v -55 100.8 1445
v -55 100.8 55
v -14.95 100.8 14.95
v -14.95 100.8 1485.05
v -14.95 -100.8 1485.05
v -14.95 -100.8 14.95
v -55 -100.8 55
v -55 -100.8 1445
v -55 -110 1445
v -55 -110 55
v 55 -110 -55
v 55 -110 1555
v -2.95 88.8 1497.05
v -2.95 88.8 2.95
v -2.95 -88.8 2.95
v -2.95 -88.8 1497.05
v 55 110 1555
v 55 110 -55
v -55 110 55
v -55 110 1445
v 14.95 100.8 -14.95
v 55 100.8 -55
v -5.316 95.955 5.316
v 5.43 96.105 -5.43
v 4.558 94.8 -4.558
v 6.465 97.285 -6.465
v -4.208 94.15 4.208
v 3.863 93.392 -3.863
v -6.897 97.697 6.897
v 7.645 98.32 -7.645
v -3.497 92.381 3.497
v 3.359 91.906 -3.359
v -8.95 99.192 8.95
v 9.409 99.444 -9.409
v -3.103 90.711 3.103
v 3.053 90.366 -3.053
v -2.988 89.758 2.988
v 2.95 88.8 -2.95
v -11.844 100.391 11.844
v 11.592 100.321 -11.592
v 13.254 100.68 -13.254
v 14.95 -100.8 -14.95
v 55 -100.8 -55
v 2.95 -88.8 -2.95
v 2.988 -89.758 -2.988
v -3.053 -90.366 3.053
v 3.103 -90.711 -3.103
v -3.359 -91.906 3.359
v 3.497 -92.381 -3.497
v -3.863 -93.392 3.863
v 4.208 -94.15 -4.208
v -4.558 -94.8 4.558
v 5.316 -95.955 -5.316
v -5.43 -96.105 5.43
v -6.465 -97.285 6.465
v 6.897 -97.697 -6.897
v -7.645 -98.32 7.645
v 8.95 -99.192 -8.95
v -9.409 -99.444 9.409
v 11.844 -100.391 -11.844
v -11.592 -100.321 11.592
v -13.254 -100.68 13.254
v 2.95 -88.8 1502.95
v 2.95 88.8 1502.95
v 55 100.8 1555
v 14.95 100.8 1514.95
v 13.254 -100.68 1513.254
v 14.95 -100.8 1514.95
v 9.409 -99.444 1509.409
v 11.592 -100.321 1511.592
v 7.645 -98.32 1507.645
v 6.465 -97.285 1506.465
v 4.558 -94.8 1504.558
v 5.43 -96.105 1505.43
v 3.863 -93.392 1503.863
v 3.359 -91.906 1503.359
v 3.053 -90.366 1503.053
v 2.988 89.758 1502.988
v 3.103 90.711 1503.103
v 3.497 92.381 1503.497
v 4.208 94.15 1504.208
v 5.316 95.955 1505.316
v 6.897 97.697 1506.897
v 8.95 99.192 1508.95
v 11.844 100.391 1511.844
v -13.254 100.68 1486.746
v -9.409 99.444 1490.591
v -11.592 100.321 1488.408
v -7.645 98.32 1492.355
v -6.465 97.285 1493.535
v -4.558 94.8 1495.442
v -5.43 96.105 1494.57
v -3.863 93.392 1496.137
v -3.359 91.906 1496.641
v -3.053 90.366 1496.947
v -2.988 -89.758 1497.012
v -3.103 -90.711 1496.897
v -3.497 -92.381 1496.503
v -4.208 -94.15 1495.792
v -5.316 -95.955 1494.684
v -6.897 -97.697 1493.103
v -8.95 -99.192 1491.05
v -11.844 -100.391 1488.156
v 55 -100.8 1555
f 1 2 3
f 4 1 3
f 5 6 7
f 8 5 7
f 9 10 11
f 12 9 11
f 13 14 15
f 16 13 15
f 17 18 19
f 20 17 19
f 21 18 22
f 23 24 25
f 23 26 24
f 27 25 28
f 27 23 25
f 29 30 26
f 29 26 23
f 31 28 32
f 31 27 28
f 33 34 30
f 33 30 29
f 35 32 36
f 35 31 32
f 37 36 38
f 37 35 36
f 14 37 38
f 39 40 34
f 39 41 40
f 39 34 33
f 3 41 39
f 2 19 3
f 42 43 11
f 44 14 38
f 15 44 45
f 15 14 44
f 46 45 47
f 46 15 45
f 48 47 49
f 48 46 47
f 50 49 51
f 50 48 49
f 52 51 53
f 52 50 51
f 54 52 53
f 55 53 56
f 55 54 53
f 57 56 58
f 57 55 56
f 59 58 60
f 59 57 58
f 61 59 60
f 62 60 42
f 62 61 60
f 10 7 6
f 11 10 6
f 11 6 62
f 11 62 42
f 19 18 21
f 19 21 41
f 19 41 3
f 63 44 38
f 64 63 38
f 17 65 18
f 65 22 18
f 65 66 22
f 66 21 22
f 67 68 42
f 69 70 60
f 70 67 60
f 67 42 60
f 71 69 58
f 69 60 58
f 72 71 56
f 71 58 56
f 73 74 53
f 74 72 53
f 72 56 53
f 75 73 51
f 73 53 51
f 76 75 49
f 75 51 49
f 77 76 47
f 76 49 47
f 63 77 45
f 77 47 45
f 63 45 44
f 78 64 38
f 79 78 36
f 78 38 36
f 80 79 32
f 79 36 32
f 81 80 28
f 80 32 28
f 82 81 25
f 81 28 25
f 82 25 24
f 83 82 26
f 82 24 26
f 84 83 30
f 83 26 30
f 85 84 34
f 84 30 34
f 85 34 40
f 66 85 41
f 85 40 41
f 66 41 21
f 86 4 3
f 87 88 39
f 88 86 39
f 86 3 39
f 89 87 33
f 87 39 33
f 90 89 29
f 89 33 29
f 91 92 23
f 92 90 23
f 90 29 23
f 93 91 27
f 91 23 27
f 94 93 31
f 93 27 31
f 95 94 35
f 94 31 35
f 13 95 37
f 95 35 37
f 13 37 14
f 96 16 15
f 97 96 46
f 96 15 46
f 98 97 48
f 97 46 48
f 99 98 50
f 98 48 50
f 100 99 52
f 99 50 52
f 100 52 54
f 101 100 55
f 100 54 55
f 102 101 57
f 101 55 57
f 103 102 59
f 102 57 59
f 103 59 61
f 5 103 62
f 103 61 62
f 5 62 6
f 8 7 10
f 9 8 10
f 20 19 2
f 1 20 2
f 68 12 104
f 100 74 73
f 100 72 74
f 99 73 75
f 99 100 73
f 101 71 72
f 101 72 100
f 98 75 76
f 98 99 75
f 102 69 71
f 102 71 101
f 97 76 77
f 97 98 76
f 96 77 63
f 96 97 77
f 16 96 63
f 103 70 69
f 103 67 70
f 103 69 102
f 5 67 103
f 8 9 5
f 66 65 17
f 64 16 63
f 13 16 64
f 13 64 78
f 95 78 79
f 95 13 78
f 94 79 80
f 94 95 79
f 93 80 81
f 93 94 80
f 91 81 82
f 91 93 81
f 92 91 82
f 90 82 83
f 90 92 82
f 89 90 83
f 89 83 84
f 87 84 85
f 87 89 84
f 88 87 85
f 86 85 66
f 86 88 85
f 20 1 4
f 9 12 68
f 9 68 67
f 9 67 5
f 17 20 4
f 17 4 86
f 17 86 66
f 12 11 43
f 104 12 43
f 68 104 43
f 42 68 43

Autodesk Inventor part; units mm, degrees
ref_plane "Start plane" through (0, 0, -55) normal (0, 0, 1) x (1, 0, 0)
ref_plane "End plane" through (0, 0, 1555) normal (0, 0, 1) x (1, 0, 0)
sketch "Sketch2" plane through (0, 0, 0) normal (0, 0, 1) x (1, 0, 0)
  line L0 (-55, 100.8) -> (-14.95, 100.8)
  line L1 (-55, 110) -> (-55, 100.8)
  line L2 (55, 110) -> (-55, 110)
  line L3 (55, 100.8) -> (55, 110)
  line L4 (14.95, 100.8) -> (55, 100.8)
  line L5 (2.95, -88.8) -> (2.95, 88.8)
  line L6 (55, -100.8) -> (14.95, -100.8)
  line L7 (55, -110) -> (55, -100.8)
  line L8 (-55, -100.8) -> (-55, -110)
  line L9 (-14.95, -100.8) -> (-55, -100.8)
  line L10 (-2.95, 88.8) -> (-2.95, -88.8)
  line L11 (0, -154) -> (0, 154) construction
  line L12 (-2.95, -100.8) -> (2.95, -100.8) construction
  arc A0 (-14.95, -100.8) -> (-2.95, -88.8) centre (-14.95, -88.8) ccw
  arc A1 (-2.95, 88.8) -> (-14.95, 100.8) centre (-14.95, 88.8) ccw
  arc A2 (14.95, 100.8) -> (2.95, 88.8) centre (14.95, 88.8) ccw
  arc A3 (2.95, -88.8) -> (14.95, -100.8) centre (14.95, -88.8) ccw
  line L13 (-77, 0) -> (77, 0) construction
  line L14 (-55, -110) -> (55, -110)
  point P0 (-2.95, 100.8)
  point P1 (2.95, 100.8)
  point P2 (0, 0)
  point P3 (0, -100.8)
  point P4 (0, 0)
  dimension "d1" = 220
  dimension "d3" = 9.2
  dimension "d5" = 5.9
  dimension "d7" = 110
  dimension "d13" = 12
  dimension "d14" = 110
  dimension "d15" = 55
extrude "Body" add sketch "Sketch2" along normal up to surface (1610 mm away) from surface at -55
sketch "Sketch3" plane through (0, 0, 0) normal (0, 0, 1) x (1, 0, 0)
  line L0 (0, 0) -> (10, 0)
ref_plane "Work Plane3" through (0, 0, 0) normal (0, -1, 0) x (1, 0, 0)
ref_plane "Work Plane4" through (55, 0, 1555) normal (-0.7071, 0, 0.7071) x (0.7071, 0, 0.7071)
split "Split1" plane through (55, 0, 1555) removes the side toward (-0.7071, 0, 0.7071)
ref_plane "Work Plane5" through (55, 0, -55) normal (-0.7071, 0, -0.7071) x (-0.7071, 0, 0.7071)
split "Split2" plane through (55, 0, -55) removes the side toward (-0.7071, 0, -0.7071)
sketch "Sketch4" plane through (0, 0, 0) normal (0, -1, 0) x (1, 0, 0)
  line L0 (-2, -55) -> (12, -55) projected
  line L1 (-2, 1555) -> (12, 1555) projected
  dimension "d19" = 1610
equation "\"d1\" = ParH"
equation "\"d3\" = t2"
equation "\"d5\" = t1"
equation "\"d7\" = b"
equation "\"d13\" = R1"
equation "\"d14\" = 0.5 * d1"
equation "\"d15\" = 0.5 * d7"
equation "\"d8\" = G_L"
equation "\"b\" = 110"
equation "\"ParH\" = 220"
equation "\"R1\" = 12"
equation "\"G_L\" = d19"
equation "\"t1\" = 5.9"
equation "\"t2\" = 9.2"
equation "\"G_OFFSET_START\" = 55"
equation "\"G_OFFSET_END\" = 55"
equation "\"d16\" = -G_OFFSET_START"
equation "\"d17\" = G_OFFSET_END + B_L"
equation "\"B_L\" = 1500"
properties part number "DIN 1025 - IPE 220-1610" material "Steel, Mild"
